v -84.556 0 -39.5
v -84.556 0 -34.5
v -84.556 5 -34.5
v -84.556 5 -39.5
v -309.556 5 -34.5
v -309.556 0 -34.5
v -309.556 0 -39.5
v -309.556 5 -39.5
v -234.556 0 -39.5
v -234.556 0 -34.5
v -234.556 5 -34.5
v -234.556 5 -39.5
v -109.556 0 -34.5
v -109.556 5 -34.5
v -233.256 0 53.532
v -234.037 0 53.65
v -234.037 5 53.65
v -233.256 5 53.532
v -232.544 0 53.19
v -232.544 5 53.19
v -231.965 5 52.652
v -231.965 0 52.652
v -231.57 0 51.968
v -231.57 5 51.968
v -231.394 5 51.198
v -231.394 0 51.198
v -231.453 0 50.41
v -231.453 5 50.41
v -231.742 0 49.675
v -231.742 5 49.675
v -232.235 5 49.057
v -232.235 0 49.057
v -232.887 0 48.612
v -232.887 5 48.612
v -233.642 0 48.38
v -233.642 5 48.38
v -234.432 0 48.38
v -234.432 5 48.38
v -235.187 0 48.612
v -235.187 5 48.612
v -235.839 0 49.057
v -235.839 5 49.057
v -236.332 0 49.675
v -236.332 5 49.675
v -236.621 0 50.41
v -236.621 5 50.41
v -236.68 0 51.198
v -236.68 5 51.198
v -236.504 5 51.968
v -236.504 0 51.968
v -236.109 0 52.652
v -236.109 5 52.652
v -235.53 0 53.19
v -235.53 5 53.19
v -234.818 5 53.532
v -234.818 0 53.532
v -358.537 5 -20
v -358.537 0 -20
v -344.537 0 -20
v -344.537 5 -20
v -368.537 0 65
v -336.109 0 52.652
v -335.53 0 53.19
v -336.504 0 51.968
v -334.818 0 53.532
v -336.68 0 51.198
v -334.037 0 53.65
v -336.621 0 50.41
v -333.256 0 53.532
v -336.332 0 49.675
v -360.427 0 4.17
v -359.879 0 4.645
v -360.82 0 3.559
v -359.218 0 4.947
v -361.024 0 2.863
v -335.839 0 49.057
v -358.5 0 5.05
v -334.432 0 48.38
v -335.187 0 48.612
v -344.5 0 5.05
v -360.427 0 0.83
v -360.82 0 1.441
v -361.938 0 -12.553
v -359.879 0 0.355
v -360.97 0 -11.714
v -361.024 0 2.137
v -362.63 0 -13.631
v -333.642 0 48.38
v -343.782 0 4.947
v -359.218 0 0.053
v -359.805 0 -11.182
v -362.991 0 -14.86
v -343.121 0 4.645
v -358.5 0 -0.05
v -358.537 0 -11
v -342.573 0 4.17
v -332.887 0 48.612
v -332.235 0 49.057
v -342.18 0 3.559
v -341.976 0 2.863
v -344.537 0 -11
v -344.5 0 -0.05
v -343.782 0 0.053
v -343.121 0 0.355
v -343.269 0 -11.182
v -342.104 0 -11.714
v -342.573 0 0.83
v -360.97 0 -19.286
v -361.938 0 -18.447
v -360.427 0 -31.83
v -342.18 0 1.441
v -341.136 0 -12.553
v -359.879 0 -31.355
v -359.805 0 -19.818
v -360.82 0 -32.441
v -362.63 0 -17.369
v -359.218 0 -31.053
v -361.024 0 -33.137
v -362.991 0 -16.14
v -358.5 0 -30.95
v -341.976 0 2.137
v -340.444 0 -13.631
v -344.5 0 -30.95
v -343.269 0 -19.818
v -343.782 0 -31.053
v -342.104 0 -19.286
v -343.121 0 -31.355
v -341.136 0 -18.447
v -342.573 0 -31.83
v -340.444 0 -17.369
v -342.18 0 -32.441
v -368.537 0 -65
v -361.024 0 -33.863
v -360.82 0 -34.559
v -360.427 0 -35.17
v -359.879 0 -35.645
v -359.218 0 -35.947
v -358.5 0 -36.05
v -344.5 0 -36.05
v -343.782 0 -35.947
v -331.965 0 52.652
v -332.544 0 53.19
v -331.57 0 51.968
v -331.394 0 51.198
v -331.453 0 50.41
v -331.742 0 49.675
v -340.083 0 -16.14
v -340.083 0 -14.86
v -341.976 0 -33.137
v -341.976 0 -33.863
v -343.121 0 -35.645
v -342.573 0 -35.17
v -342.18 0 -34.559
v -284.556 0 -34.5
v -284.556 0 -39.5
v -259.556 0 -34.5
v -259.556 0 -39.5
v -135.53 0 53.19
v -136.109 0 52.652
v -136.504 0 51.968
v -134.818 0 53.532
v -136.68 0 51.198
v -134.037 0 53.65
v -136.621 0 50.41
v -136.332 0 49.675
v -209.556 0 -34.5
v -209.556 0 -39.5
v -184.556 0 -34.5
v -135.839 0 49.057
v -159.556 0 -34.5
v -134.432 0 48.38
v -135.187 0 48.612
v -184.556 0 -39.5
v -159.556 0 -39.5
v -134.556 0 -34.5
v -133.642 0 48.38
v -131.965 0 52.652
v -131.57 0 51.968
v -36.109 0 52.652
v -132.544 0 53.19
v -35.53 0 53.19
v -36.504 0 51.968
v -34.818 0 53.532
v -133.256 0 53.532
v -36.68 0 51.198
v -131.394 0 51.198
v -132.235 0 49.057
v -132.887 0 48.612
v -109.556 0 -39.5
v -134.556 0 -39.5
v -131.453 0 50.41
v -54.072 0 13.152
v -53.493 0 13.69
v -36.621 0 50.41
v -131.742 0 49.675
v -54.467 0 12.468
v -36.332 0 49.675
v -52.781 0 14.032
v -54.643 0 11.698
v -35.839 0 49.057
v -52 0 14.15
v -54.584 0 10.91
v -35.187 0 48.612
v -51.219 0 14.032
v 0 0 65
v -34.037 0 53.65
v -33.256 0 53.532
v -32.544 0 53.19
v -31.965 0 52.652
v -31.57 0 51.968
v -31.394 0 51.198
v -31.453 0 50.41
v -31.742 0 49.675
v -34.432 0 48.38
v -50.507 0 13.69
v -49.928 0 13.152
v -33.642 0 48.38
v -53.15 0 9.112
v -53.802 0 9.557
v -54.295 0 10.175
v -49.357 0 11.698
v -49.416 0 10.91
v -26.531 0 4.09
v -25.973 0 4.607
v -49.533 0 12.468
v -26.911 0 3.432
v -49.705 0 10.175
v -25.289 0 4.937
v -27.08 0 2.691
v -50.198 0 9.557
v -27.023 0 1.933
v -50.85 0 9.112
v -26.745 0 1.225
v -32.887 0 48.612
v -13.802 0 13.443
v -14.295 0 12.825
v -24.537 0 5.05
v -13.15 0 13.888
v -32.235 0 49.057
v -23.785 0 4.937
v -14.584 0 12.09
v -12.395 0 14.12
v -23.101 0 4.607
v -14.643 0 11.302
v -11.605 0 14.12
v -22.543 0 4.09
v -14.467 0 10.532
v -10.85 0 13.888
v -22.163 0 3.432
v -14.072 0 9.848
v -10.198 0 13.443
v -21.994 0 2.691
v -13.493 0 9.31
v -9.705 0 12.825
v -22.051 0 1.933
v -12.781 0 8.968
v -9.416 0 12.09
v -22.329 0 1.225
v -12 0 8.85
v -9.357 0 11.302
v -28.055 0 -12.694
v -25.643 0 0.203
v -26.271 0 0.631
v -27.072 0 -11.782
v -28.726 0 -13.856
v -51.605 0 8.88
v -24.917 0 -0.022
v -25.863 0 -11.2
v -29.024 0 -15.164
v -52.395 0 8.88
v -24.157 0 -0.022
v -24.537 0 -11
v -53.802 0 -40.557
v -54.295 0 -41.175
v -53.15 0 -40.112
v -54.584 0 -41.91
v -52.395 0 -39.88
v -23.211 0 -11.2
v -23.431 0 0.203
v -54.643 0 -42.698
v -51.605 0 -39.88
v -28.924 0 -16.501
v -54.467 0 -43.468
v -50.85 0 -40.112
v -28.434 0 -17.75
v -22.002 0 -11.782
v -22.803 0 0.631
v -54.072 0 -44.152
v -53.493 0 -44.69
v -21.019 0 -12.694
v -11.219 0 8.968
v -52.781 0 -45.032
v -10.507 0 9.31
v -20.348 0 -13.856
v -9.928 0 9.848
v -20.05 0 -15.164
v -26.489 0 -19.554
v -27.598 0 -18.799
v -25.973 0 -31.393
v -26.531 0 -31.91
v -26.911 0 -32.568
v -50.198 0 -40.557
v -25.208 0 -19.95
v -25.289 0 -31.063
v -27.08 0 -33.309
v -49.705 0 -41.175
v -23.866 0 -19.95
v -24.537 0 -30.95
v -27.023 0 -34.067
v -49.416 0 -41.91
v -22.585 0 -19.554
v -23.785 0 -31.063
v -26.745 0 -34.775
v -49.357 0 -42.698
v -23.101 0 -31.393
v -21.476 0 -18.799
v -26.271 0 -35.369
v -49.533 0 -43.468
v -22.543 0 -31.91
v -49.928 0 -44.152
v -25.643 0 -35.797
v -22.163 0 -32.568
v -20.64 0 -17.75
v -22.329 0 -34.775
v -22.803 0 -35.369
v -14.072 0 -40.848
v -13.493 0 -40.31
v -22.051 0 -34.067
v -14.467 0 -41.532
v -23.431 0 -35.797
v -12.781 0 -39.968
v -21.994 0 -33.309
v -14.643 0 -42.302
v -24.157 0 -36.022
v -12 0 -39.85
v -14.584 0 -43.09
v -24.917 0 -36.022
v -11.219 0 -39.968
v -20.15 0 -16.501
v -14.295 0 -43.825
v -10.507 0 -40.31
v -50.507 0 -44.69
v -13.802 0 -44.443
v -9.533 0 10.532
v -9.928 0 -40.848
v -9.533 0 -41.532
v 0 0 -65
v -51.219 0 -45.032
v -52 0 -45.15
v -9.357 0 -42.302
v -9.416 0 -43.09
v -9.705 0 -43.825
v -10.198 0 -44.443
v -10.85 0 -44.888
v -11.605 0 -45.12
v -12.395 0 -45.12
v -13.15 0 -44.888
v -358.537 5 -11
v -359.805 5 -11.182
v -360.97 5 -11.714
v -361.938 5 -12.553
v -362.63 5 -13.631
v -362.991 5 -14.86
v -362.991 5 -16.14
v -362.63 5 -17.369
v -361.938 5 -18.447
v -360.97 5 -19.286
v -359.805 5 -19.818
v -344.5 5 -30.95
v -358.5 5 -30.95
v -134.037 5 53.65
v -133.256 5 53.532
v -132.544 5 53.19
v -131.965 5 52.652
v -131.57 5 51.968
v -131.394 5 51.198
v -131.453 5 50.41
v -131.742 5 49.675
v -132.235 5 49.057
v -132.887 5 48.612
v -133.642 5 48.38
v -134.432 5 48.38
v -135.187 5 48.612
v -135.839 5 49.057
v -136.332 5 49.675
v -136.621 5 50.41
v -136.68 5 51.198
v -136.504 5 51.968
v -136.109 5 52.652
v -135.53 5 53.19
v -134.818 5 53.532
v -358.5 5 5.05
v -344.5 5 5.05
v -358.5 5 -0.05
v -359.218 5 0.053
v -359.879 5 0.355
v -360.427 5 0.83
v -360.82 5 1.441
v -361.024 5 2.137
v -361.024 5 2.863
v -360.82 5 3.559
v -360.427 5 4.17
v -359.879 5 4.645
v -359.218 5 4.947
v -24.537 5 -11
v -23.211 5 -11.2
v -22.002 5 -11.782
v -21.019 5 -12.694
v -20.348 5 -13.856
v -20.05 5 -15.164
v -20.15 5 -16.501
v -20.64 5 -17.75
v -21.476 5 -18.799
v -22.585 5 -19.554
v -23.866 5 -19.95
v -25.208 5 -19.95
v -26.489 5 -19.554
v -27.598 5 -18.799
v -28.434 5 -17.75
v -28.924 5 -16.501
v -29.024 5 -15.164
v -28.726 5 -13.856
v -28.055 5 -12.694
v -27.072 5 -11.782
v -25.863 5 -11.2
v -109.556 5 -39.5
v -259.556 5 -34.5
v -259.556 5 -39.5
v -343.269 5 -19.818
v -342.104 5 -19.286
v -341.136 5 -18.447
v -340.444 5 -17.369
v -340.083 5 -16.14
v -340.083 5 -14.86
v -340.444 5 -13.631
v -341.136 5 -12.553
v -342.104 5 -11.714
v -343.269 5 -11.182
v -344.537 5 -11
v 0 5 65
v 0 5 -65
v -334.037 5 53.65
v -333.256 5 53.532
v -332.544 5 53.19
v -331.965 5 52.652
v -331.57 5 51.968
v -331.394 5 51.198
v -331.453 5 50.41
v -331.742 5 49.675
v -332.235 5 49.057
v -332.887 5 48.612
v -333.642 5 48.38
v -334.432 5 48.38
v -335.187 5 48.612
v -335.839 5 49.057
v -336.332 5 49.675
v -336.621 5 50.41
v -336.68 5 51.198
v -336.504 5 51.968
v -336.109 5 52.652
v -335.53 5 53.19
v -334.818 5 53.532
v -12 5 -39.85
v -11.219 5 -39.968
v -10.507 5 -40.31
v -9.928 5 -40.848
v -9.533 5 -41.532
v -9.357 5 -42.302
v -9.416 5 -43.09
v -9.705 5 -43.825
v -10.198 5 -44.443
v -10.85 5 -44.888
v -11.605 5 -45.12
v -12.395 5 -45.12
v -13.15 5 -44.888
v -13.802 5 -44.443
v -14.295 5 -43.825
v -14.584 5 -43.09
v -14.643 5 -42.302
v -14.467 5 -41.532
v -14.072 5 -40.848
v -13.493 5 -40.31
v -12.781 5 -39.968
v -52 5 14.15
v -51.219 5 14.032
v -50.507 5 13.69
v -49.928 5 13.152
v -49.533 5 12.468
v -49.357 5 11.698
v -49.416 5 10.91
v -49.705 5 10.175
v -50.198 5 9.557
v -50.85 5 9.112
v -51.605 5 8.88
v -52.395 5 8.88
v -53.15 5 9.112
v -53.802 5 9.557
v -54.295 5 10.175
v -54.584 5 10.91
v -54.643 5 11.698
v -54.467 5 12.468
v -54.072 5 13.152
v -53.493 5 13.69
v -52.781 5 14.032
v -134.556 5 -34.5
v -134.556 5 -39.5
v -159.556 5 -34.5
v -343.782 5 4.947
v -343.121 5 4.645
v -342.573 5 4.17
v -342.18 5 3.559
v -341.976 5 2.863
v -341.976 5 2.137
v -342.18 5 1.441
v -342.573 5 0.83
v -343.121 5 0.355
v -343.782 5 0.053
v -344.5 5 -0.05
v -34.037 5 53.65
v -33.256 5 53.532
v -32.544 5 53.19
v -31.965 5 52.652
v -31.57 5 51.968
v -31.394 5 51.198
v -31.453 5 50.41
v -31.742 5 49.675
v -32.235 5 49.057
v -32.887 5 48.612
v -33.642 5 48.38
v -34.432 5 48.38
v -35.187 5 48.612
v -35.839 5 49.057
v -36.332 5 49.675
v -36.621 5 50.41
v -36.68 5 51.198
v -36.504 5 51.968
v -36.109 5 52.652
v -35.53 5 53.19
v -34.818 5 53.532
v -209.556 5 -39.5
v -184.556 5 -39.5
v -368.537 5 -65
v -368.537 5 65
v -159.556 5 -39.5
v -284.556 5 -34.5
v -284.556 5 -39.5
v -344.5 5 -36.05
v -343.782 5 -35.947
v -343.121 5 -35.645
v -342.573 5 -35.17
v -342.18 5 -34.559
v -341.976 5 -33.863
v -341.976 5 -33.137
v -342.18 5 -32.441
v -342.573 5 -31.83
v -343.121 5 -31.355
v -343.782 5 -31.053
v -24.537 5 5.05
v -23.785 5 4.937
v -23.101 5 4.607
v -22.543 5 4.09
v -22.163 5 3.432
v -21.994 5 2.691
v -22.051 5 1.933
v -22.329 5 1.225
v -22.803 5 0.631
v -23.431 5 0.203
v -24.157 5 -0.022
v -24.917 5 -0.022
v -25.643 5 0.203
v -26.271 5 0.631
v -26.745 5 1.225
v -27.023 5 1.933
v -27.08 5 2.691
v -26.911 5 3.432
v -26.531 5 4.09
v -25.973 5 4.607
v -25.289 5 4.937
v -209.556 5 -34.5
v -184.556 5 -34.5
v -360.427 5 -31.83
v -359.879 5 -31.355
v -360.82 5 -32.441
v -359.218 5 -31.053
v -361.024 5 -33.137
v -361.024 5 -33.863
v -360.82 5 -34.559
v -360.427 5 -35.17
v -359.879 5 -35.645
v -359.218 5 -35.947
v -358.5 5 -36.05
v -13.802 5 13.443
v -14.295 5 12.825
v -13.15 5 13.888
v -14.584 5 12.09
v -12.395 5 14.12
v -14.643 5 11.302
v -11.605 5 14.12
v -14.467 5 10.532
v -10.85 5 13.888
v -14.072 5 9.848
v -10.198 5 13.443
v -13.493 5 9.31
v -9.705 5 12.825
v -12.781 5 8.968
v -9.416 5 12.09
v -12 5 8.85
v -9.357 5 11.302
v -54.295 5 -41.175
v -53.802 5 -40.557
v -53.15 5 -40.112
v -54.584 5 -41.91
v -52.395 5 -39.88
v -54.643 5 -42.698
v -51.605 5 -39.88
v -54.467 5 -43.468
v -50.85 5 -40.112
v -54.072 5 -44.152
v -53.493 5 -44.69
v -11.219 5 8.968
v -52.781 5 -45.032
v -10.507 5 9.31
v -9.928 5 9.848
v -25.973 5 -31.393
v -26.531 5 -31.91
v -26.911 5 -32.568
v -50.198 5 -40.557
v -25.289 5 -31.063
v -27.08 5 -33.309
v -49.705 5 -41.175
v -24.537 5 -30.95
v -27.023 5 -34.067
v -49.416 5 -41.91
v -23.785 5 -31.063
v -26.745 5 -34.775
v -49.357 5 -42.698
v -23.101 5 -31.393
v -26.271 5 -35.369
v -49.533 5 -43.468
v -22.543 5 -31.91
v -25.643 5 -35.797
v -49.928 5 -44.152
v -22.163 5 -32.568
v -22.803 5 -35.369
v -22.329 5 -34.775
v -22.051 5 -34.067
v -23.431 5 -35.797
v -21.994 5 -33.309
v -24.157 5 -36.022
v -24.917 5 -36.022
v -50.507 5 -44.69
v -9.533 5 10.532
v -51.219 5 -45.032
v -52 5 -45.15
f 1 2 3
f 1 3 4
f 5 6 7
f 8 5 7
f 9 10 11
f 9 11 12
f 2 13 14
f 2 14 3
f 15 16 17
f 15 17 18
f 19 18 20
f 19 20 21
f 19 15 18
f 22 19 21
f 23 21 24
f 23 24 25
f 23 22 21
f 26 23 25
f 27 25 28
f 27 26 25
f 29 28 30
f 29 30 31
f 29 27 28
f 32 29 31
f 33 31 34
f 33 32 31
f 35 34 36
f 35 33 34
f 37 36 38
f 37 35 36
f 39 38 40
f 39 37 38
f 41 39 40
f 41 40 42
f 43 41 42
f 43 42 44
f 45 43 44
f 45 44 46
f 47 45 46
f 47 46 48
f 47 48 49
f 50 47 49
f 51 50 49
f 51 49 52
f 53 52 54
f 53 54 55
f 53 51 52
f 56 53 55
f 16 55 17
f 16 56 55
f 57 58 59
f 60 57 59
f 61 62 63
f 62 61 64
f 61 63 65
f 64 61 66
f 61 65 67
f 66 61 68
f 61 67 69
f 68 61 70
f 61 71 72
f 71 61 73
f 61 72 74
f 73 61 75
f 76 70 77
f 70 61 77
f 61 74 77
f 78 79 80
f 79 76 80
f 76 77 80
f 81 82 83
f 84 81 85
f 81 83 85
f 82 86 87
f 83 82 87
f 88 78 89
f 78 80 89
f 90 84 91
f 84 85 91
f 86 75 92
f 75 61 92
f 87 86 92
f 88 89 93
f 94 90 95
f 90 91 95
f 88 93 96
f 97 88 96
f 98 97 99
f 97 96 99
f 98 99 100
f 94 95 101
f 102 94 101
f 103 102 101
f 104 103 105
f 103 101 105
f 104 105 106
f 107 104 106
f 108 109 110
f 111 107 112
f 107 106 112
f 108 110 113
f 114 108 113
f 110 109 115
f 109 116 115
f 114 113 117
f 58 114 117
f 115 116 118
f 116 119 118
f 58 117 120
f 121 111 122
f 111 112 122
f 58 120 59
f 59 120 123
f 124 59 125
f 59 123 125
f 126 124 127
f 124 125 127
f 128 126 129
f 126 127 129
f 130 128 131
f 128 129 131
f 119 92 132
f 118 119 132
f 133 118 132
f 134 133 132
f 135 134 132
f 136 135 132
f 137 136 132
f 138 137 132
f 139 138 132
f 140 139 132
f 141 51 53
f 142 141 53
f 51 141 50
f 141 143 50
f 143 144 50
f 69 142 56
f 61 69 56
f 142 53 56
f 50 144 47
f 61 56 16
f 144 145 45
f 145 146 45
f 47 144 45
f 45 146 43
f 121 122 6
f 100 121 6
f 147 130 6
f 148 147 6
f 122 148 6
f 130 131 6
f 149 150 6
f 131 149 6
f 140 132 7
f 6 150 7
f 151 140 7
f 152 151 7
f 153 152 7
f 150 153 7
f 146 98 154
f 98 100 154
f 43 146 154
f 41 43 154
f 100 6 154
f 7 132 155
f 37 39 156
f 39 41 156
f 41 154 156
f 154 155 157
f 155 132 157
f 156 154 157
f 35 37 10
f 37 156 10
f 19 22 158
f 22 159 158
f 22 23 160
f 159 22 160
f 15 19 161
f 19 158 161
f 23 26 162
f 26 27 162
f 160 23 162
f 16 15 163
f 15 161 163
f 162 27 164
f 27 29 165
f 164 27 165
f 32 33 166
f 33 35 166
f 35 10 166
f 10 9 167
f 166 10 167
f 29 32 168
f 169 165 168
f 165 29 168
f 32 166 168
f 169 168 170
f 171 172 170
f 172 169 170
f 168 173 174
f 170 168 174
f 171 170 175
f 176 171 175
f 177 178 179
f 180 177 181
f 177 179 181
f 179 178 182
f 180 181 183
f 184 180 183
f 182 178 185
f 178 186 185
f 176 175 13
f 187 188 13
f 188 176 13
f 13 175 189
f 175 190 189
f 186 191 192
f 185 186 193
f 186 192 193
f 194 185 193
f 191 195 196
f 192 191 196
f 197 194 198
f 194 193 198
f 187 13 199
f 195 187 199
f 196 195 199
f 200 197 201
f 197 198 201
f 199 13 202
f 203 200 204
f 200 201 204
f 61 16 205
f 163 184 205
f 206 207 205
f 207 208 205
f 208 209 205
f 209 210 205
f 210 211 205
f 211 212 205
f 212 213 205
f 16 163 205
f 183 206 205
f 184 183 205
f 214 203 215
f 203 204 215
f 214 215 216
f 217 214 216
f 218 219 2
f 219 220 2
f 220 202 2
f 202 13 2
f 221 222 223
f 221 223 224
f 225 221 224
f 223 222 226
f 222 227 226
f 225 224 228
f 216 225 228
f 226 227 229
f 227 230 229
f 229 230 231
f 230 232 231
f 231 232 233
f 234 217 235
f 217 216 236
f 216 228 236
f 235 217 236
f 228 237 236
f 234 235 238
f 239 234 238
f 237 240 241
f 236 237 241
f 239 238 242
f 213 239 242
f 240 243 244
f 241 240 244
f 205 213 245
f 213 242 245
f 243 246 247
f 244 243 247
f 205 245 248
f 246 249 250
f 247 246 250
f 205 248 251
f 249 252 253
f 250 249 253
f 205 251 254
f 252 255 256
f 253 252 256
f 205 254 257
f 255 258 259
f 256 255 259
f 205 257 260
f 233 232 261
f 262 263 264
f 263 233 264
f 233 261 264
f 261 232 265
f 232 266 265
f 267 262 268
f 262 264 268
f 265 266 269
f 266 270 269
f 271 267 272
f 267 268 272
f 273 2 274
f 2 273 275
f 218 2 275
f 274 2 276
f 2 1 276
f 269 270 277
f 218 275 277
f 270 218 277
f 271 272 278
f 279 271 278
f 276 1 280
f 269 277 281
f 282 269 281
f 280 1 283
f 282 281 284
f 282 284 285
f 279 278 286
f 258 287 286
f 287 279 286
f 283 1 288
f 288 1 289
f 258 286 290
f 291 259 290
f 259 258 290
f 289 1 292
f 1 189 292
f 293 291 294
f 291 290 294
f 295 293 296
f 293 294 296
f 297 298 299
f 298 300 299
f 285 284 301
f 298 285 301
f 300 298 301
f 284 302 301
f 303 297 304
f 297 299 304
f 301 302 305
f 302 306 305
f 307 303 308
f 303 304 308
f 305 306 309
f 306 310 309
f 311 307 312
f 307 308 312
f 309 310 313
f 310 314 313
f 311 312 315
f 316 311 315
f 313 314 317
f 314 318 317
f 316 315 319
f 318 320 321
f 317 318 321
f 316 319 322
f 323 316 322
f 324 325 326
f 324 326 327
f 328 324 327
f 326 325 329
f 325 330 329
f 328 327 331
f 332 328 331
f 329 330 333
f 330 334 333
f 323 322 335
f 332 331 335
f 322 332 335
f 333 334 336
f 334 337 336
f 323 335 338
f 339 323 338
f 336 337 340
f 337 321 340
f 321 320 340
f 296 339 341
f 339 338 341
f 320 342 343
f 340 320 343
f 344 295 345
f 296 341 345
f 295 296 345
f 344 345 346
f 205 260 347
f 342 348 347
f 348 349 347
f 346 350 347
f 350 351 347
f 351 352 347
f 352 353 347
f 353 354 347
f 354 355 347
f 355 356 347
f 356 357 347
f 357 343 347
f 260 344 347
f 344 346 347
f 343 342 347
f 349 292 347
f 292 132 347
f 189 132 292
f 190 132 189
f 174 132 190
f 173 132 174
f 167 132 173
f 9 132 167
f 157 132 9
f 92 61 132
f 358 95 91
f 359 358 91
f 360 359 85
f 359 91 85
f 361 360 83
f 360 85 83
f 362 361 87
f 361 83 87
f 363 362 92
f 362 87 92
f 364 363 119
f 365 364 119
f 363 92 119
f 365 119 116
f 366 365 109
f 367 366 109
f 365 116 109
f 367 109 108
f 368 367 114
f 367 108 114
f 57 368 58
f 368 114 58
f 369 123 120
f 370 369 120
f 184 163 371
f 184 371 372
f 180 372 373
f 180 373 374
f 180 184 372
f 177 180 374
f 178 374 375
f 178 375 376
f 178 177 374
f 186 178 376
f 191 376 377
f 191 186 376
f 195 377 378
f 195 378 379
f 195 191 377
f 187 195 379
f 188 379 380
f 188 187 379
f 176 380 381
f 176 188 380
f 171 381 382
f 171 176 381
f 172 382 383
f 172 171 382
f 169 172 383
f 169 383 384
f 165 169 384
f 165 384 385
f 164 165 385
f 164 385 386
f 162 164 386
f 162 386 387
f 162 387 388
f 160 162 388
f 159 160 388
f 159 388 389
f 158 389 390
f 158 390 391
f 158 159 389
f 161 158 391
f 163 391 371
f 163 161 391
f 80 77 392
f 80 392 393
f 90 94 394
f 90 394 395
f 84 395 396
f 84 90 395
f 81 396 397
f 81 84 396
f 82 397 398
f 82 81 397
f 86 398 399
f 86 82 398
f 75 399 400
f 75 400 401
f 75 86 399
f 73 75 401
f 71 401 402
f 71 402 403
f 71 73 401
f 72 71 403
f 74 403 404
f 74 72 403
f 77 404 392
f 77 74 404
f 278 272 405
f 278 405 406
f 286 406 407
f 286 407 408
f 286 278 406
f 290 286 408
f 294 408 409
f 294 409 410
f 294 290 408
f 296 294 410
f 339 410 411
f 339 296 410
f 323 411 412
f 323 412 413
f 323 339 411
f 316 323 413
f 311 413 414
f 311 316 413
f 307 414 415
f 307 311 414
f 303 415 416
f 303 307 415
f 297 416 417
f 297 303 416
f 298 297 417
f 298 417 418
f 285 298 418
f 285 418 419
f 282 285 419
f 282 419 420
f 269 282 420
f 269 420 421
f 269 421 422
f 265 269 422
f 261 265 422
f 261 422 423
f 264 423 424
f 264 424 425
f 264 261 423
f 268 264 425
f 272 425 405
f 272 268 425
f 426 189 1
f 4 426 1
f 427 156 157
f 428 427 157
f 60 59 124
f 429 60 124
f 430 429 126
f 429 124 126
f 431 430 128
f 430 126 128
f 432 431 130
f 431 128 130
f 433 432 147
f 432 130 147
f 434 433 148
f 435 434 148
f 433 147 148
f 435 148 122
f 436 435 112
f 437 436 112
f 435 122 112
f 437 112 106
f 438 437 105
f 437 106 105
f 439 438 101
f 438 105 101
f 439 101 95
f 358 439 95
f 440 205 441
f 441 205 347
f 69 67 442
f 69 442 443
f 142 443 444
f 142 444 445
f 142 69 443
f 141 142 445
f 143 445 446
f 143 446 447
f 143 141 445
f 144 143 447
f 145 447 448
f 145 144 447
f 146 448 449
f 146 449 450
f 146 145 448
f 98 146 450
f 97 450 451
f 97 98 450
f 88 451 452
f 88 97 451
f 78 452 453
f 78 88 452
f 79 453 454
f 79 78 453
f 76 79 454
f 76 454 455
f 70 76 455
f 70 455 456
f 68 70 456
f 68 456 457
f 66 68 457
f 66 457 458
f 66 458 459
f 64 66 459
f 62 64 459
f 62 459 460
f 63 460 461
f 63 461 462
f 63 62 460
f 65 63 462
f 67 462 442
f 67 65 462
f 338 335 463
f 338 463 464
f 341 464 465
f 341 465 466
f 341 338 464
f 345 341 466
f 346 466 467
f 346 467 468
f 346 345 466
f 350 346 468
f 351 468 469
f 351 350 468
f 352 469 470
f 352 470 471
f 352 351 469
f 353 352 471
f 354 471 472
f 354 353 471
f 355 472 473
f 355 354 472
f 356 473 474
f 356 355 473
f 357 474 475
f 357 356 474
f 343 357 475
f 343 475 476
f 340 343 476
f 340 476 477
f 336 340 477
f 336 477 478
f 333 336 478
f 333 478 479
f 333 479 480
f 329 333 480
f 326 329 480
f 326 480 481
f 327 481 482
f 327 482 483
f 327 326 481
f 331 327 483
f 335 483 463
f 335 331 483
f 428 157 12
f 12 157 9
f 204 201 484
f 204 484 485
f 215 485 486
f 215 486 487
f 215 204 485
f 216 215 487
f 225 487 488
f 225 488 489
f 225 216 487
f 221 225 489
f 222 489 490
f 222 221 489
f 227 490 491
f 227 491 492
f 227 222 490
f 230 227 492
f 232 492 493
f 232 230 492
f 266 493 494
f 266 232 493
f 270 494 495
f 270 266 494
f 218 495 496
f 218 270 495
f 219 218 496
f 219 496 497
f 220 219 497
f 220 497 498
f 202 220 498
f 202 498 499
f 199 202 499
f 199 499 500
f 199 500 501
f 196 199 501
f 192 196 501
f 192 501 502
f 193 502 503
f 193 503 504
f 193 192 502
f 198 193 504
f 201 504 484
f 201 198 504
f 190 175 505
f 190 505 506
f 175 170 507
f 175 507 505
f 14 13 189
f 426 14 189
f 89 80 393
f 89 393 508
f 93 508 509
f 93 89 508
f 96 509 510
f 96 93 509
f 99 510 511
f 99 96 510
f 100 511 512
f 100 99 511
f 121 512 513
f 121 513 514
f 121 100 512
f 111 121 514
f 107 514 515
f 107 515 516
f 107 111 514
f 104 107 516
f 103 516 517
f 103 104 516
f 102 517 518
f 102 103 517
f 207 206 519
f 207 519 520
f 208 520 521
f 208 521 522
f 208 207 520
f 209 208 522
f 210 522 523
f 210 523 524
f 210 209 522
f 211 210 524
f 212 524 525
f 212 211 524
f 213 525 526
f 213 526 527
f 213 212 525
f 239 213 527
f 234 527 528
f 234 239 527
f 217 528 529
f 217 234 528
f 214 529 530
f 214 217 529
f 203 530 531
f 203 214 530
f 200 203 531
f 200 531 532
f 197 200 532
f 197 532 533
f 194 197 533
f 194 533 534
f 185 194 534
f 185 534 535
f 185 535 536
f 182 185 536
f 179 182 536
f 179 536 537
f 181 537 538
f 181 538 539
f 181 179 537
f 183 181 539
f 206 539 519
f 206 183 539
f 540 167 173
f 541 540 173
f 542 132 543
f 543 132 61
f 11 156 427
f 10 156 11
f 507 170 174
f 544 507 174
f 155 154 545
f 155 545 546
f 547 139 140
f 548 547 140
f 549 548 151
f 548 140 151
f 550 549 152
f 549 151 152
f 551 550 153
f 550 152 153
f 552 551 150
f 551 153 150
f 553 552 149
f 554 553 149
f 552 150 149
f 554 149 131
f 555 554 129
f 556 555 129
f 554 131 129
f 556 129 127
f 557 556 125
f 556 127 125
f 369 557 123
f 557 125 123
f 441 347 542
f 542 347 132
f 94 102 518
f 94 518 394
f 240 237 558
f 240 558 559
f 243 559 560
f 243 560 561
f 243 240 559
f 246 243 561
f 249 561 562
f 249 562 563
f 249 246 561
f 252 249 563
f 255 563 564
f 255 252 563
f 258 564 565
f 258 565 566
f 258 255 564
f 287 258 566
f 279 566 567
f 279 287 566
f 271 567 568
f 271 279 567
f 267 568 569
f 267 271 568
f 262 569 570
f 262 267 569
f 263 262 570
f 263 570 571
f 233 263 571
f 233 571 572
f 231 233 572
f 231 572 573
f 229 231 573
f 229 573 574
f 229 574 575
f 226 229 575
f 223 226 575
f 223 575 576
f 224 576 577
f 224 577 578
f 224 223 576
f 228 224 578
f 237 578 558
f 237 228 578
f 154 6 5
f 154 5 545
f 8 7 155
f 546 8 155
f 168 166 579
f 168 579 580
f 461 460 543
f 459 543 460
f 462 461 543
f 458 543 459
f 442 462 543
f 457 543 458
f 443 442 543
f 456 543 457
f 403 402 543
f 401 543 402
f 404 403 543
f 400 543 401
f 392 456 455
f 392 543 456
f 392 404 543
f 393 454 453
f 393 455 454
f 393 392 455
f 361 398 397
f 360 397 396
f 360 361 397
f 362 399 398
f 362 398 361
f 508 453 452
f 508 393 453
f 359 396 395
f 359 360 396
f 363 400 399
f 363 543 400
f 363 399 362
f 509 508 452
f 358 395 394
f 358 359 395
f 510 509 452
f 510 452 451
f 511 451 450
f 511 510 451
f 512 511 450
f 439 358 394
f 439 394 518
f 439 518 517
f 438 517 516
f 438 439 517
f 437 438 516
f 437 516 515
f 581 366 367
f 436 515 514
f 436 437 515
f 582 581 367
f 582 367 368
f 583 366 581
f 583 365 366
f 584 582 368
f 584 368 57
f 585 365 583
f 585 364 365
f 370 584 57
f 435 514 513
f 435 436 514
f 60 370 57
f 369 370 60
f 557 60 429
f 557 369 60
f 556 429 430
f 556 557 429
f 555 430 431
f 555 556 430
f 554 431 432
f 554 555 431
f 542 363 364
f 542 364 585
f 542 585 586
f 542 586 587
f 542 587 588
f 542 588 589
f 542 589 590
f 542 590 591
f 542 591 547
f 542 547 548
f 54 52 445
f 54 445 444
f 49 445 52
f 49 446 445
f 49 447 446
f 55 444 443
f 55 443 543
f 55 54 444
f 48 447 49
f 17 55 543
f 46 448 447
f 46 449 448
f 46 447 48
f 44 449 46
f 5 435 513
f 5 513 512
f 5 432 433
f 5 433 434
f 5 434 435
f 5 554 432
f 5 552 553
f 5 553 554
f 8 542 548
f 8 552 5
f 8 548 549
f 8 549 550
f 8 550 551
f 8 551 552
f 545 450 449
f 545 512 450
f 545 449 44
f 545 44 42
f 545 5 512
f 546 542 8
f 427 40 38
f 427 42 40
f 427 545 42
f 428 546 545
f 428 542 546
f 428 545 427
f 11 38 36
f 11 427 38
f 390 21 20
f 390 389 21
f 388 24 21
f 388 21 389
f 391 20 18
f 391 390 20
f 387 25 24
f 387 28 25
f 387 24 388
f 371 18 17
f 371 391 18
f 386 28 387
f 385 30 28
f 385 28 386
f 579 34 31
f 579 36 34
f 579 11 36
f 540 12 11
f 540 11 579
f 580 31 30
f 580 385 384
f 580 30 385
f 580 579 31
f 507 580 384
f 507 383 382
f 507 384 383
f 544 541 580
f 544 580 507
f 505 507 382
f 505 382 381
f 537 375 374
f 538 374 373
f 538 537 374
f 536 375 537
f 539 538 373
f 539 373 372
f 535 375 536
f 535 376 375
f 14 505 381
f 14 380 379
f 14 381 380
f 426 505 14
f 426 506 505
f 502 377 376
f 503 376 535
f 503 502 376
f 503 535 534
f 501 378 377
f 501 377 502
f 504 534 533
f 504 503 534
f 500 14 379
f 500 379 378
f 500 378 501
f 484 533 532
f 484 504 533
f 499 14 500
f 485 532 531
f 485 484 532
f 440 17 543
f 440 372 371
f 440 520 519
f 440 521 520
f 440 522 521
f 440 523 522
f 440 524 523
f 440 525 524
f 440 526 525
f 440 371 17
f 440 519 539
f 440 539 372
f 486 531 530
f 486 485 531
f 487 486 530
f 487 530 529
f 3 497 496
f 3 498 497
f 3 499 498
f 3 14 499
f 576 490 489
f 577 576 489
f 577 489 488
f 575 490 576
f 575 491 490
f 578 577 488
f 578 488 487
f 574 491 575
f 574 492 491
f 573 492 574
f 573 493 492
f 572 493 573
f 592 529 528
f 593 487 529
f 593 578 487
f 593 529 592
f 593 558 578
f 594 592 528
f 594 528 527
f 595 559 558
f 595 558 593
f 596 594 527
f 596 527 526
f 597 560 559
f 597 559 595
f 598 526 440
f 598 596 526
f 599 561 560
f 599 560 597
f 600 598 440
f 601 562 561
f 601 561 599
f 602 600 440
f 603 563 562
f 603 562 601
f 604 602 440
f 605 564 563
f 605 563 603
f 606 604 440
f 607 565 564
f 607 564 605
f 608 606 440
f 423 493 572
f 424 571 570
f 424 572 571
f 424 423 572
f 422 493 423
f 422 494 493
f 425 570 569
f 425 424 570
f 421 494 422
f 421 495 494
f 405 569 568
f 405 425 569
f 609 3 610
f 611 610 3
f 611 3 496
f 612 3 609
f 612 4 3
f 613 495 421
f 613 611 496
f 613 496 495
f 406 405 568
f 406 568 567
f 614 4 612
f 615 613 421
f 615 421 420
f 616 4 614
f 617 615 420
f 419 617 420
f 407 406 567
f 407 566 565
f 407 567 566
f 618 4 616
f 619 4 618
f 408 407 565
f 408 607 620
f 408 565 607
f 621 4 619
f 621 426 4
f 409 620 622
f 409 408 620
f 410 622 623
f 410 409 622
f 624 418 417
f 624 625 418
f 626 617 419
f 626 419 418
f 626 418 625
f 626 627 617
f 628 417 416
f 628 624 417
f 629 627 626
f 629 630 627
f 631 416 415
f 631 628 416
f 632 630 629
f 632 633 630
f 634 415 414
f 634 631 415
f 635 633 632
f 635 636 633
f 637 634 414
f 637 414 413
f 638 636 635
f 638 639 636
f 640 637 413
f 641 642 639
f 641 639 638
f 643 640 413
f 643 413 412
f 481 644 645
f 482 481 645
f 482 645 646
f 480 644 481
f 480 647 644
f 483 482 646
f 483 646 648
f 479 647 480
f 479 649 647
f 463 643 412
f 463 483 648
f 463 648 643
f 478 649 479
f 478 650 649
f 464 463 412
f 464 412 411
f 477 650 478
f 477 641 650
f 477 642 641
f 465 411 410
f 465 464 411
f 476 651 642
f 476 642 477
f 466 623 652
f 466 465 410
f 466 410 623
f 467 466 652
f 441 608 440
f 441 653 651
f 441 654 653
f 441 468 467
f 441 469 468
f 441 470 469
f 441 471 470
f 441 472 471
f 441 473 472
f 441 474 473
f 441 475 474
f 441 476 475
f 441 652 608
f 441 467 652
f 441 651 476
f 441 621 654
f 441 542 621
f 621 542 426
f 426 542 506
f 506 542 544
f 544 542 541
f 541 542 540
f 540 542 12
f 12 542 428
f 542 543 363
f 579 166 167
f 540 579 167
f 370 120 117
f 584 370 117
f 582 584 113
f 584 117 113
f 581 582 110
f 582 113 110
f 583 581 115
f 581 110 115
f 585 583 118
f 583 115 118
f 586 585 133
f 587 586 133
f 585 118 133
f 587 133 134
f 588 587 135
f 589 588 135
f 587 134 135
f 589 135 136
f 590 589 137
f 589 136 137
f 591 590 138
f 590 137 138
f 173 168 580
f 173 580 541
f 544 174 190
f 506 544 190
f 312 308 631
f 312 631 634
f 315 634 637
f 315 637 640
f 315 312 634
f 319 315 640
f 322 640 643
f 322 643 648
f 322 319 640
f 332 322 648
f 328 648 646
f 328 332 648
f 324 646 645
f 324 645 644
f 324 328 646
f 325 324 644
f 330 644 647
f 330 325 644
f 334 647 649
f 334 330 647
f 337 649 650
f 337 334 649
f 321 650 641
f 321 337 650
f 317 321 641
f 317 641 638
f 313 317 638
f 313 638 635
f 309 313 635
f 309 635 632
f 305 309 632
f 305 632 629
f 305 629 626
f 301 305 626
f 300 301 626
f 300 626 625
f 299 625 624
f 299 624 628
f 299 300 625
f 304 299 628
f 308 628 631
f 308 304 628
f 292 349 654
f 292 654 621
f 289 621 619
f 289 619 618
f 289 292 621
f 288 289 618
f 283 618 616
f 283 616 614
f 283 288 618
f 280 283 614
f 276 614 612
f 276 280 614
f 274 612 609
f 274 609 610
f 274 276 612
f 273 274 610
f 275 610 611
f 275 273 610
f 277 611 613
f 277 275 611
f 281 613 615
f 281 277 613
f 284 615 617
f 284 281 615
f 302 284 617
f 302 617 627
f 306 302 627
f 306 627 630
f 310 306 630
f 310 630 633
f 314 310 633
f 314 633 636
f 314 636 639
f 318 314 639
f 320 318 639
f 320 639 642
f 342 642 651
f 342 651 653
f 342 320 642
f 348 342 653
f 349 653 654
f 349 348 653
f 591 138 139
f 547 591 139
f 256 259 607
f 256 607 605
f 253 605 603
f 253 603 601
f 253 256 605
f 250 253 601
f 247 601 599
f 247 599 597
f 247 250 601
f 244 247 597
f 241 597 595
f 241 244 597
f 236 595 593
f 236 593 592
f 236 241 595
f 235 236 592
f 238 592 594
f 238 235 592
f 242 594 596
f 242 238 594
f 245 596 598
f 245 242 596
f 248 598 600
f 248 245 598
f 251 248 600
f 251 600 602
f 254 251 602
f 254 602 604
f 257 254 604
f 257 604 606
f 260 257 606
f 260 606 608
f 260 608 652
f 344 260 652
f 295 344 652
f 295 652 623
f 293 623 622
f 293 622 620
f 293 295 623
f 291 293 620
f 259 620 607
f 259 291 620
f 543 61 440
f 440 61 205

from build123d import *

# Parameters (mm, degrees)
SKETCH1_R           = 2.65
SKETCH1_R_2         = 2.55
SKETCH1_R_3         = 4.5
SKETCH1_W           = 25
SKETCH1_H           = 5
BOSS_EXTRUDE1_DEPTH = 5


with BuildPart() as part:
    # Sketch1 → Boss-Extrude1 (new body)
    with BuildSketch(Plane(origin=(0, 0, 0), x_dir=(1, 0, 0), z_dir=(0, 1, 0))):
        Polygon((0, 0), (0, 40), (0, 65), (-368.537, 65), (-368.537, -65), (0, -65), align=None)
        with Locations(Location((-12, 42.5, 0), (0, 0, 270))):
            Circle(SKETCH1_R, mode=Mode.SUBTRACT)
        with Locations(Location((-24.537, 33.5, 0), (0, 0, 270))):
            Circle(SKETCH1_R_2, mode=Mode.SUBTRACT)
        with Locations(Location((-24.537, -2.5, 0), (0, 0, 270))):
            Circle(SKETCH1_R_2, mode=Mode.SUBTRACT)
        with Locations(Location((-24.537, 15.5, 0), (0, 0, 270))):
            Circle(SKETCH1_R_3, mode=Mode.SUBTRACT)
        with Locations(Location((-12, -11.5, 0), (0, 0, 90))):
            Circle(SKETCH1_R, mode=Mode.SUBTRACT)
        with Locations(Location((-334.037, -51, 0), (0, 0, 270))):
            Circle(SKETCH1_R, mode=Mode.SUBTRACT)
        with Locations(Location((-234.037, -51, 0), (0, 0, 270))):
            Circle(SKETCH1_R, mode=Mode.SUBTRACT)
        with Locations(Location((-134.037, -51, 0), (0, 0, 270))):
            Circle(SKETCH1_R, mode=Mode.SUBTRACT)
        with Locations(Location((-34.037, -51, 0), (0, 0, 270))):
            Circle(SKETCH1_R, mode=Mode.SUBTRACT)
        with Locations(Location((-52, -11.5, 0), (0, 0, 270))):
            Circle(SKETCH1_R, mode=Mode.SUBTRACT)
        with Locations(Location((-52, 42.5, 0), (0, 0, 90))):
            Circle(SKETCH1_R, mode=Mode.SUBTRACT)
        with BuildLine():
            Line((-358.537, 20), (-344.537, 20))
            ThreePointArc((-344.537, 20), (-340.037, 15.5), (-344.537, 11))
            Line((-344.537, 11), (-358.537, 11))
            ThreePointArc((-358.537, 11), (-363.037, 15.5), (-358.537, 20))
        make_face(mode=Mode.SUBTRACT)
        with BuildLine():
            Line((-344.5, 0.05), (-358.5, 0.05))
            ThreePointArc((-358.5, 0.05), (-361.05, -2.5), (-358.5, -5.05))
            Line((-358.5, -5.05), (-344.5, -5.05))
            ThreePointArc((-344.5, -5.05), (-341.95, -2.5), (-344.5, 0.05))
        make_face(mode=Mode.SUBTRACT)
        with Locations((-297.055571099, 37)):
            Rectangle(SKETCH1_W, SKETCH1_H, mode=Mode.SUBTRACT)
        with Locations((-247.055571099, 37)):
            Rectangle(SKETCH1_W, SKETCH1_H, mode=Mode.SUBTRACT)
        with BuildLine():
            Line((-358.5, 36.05), (-344.5, 36.05))
            ThreePointArc((-344.5, 36.05), (-341.95, 33.5), (-344.5, 30.95))
            Line((-344.5, 30.95), (-358.5, 30.95))
            ThreePointArc((-358.5, 30.95), (-361.05, 33.5), (-358.5, 36.05))
        make_face(mode=Mode.SUBTRACT)
        with Locations((-197.055571099, 37)):
            Rectangle(SKETCH1_W, SKETCH1_H, mode=Mode.SUBTRACT)
        with Locations((-147.055571099, 37)):
            Rectangle(SKETCH1_W, SKETCH1_H, mode=Mode.SUBTRACT)
        with Locations((-97.055571099, 37)):
            Rectangle(SKETCH1_W, SKETCH1_H, mode=Mode.SUBTRACT)
    extrude(amount=BOSS_EXTRUDE1_DEPTH)


solid = part.part
